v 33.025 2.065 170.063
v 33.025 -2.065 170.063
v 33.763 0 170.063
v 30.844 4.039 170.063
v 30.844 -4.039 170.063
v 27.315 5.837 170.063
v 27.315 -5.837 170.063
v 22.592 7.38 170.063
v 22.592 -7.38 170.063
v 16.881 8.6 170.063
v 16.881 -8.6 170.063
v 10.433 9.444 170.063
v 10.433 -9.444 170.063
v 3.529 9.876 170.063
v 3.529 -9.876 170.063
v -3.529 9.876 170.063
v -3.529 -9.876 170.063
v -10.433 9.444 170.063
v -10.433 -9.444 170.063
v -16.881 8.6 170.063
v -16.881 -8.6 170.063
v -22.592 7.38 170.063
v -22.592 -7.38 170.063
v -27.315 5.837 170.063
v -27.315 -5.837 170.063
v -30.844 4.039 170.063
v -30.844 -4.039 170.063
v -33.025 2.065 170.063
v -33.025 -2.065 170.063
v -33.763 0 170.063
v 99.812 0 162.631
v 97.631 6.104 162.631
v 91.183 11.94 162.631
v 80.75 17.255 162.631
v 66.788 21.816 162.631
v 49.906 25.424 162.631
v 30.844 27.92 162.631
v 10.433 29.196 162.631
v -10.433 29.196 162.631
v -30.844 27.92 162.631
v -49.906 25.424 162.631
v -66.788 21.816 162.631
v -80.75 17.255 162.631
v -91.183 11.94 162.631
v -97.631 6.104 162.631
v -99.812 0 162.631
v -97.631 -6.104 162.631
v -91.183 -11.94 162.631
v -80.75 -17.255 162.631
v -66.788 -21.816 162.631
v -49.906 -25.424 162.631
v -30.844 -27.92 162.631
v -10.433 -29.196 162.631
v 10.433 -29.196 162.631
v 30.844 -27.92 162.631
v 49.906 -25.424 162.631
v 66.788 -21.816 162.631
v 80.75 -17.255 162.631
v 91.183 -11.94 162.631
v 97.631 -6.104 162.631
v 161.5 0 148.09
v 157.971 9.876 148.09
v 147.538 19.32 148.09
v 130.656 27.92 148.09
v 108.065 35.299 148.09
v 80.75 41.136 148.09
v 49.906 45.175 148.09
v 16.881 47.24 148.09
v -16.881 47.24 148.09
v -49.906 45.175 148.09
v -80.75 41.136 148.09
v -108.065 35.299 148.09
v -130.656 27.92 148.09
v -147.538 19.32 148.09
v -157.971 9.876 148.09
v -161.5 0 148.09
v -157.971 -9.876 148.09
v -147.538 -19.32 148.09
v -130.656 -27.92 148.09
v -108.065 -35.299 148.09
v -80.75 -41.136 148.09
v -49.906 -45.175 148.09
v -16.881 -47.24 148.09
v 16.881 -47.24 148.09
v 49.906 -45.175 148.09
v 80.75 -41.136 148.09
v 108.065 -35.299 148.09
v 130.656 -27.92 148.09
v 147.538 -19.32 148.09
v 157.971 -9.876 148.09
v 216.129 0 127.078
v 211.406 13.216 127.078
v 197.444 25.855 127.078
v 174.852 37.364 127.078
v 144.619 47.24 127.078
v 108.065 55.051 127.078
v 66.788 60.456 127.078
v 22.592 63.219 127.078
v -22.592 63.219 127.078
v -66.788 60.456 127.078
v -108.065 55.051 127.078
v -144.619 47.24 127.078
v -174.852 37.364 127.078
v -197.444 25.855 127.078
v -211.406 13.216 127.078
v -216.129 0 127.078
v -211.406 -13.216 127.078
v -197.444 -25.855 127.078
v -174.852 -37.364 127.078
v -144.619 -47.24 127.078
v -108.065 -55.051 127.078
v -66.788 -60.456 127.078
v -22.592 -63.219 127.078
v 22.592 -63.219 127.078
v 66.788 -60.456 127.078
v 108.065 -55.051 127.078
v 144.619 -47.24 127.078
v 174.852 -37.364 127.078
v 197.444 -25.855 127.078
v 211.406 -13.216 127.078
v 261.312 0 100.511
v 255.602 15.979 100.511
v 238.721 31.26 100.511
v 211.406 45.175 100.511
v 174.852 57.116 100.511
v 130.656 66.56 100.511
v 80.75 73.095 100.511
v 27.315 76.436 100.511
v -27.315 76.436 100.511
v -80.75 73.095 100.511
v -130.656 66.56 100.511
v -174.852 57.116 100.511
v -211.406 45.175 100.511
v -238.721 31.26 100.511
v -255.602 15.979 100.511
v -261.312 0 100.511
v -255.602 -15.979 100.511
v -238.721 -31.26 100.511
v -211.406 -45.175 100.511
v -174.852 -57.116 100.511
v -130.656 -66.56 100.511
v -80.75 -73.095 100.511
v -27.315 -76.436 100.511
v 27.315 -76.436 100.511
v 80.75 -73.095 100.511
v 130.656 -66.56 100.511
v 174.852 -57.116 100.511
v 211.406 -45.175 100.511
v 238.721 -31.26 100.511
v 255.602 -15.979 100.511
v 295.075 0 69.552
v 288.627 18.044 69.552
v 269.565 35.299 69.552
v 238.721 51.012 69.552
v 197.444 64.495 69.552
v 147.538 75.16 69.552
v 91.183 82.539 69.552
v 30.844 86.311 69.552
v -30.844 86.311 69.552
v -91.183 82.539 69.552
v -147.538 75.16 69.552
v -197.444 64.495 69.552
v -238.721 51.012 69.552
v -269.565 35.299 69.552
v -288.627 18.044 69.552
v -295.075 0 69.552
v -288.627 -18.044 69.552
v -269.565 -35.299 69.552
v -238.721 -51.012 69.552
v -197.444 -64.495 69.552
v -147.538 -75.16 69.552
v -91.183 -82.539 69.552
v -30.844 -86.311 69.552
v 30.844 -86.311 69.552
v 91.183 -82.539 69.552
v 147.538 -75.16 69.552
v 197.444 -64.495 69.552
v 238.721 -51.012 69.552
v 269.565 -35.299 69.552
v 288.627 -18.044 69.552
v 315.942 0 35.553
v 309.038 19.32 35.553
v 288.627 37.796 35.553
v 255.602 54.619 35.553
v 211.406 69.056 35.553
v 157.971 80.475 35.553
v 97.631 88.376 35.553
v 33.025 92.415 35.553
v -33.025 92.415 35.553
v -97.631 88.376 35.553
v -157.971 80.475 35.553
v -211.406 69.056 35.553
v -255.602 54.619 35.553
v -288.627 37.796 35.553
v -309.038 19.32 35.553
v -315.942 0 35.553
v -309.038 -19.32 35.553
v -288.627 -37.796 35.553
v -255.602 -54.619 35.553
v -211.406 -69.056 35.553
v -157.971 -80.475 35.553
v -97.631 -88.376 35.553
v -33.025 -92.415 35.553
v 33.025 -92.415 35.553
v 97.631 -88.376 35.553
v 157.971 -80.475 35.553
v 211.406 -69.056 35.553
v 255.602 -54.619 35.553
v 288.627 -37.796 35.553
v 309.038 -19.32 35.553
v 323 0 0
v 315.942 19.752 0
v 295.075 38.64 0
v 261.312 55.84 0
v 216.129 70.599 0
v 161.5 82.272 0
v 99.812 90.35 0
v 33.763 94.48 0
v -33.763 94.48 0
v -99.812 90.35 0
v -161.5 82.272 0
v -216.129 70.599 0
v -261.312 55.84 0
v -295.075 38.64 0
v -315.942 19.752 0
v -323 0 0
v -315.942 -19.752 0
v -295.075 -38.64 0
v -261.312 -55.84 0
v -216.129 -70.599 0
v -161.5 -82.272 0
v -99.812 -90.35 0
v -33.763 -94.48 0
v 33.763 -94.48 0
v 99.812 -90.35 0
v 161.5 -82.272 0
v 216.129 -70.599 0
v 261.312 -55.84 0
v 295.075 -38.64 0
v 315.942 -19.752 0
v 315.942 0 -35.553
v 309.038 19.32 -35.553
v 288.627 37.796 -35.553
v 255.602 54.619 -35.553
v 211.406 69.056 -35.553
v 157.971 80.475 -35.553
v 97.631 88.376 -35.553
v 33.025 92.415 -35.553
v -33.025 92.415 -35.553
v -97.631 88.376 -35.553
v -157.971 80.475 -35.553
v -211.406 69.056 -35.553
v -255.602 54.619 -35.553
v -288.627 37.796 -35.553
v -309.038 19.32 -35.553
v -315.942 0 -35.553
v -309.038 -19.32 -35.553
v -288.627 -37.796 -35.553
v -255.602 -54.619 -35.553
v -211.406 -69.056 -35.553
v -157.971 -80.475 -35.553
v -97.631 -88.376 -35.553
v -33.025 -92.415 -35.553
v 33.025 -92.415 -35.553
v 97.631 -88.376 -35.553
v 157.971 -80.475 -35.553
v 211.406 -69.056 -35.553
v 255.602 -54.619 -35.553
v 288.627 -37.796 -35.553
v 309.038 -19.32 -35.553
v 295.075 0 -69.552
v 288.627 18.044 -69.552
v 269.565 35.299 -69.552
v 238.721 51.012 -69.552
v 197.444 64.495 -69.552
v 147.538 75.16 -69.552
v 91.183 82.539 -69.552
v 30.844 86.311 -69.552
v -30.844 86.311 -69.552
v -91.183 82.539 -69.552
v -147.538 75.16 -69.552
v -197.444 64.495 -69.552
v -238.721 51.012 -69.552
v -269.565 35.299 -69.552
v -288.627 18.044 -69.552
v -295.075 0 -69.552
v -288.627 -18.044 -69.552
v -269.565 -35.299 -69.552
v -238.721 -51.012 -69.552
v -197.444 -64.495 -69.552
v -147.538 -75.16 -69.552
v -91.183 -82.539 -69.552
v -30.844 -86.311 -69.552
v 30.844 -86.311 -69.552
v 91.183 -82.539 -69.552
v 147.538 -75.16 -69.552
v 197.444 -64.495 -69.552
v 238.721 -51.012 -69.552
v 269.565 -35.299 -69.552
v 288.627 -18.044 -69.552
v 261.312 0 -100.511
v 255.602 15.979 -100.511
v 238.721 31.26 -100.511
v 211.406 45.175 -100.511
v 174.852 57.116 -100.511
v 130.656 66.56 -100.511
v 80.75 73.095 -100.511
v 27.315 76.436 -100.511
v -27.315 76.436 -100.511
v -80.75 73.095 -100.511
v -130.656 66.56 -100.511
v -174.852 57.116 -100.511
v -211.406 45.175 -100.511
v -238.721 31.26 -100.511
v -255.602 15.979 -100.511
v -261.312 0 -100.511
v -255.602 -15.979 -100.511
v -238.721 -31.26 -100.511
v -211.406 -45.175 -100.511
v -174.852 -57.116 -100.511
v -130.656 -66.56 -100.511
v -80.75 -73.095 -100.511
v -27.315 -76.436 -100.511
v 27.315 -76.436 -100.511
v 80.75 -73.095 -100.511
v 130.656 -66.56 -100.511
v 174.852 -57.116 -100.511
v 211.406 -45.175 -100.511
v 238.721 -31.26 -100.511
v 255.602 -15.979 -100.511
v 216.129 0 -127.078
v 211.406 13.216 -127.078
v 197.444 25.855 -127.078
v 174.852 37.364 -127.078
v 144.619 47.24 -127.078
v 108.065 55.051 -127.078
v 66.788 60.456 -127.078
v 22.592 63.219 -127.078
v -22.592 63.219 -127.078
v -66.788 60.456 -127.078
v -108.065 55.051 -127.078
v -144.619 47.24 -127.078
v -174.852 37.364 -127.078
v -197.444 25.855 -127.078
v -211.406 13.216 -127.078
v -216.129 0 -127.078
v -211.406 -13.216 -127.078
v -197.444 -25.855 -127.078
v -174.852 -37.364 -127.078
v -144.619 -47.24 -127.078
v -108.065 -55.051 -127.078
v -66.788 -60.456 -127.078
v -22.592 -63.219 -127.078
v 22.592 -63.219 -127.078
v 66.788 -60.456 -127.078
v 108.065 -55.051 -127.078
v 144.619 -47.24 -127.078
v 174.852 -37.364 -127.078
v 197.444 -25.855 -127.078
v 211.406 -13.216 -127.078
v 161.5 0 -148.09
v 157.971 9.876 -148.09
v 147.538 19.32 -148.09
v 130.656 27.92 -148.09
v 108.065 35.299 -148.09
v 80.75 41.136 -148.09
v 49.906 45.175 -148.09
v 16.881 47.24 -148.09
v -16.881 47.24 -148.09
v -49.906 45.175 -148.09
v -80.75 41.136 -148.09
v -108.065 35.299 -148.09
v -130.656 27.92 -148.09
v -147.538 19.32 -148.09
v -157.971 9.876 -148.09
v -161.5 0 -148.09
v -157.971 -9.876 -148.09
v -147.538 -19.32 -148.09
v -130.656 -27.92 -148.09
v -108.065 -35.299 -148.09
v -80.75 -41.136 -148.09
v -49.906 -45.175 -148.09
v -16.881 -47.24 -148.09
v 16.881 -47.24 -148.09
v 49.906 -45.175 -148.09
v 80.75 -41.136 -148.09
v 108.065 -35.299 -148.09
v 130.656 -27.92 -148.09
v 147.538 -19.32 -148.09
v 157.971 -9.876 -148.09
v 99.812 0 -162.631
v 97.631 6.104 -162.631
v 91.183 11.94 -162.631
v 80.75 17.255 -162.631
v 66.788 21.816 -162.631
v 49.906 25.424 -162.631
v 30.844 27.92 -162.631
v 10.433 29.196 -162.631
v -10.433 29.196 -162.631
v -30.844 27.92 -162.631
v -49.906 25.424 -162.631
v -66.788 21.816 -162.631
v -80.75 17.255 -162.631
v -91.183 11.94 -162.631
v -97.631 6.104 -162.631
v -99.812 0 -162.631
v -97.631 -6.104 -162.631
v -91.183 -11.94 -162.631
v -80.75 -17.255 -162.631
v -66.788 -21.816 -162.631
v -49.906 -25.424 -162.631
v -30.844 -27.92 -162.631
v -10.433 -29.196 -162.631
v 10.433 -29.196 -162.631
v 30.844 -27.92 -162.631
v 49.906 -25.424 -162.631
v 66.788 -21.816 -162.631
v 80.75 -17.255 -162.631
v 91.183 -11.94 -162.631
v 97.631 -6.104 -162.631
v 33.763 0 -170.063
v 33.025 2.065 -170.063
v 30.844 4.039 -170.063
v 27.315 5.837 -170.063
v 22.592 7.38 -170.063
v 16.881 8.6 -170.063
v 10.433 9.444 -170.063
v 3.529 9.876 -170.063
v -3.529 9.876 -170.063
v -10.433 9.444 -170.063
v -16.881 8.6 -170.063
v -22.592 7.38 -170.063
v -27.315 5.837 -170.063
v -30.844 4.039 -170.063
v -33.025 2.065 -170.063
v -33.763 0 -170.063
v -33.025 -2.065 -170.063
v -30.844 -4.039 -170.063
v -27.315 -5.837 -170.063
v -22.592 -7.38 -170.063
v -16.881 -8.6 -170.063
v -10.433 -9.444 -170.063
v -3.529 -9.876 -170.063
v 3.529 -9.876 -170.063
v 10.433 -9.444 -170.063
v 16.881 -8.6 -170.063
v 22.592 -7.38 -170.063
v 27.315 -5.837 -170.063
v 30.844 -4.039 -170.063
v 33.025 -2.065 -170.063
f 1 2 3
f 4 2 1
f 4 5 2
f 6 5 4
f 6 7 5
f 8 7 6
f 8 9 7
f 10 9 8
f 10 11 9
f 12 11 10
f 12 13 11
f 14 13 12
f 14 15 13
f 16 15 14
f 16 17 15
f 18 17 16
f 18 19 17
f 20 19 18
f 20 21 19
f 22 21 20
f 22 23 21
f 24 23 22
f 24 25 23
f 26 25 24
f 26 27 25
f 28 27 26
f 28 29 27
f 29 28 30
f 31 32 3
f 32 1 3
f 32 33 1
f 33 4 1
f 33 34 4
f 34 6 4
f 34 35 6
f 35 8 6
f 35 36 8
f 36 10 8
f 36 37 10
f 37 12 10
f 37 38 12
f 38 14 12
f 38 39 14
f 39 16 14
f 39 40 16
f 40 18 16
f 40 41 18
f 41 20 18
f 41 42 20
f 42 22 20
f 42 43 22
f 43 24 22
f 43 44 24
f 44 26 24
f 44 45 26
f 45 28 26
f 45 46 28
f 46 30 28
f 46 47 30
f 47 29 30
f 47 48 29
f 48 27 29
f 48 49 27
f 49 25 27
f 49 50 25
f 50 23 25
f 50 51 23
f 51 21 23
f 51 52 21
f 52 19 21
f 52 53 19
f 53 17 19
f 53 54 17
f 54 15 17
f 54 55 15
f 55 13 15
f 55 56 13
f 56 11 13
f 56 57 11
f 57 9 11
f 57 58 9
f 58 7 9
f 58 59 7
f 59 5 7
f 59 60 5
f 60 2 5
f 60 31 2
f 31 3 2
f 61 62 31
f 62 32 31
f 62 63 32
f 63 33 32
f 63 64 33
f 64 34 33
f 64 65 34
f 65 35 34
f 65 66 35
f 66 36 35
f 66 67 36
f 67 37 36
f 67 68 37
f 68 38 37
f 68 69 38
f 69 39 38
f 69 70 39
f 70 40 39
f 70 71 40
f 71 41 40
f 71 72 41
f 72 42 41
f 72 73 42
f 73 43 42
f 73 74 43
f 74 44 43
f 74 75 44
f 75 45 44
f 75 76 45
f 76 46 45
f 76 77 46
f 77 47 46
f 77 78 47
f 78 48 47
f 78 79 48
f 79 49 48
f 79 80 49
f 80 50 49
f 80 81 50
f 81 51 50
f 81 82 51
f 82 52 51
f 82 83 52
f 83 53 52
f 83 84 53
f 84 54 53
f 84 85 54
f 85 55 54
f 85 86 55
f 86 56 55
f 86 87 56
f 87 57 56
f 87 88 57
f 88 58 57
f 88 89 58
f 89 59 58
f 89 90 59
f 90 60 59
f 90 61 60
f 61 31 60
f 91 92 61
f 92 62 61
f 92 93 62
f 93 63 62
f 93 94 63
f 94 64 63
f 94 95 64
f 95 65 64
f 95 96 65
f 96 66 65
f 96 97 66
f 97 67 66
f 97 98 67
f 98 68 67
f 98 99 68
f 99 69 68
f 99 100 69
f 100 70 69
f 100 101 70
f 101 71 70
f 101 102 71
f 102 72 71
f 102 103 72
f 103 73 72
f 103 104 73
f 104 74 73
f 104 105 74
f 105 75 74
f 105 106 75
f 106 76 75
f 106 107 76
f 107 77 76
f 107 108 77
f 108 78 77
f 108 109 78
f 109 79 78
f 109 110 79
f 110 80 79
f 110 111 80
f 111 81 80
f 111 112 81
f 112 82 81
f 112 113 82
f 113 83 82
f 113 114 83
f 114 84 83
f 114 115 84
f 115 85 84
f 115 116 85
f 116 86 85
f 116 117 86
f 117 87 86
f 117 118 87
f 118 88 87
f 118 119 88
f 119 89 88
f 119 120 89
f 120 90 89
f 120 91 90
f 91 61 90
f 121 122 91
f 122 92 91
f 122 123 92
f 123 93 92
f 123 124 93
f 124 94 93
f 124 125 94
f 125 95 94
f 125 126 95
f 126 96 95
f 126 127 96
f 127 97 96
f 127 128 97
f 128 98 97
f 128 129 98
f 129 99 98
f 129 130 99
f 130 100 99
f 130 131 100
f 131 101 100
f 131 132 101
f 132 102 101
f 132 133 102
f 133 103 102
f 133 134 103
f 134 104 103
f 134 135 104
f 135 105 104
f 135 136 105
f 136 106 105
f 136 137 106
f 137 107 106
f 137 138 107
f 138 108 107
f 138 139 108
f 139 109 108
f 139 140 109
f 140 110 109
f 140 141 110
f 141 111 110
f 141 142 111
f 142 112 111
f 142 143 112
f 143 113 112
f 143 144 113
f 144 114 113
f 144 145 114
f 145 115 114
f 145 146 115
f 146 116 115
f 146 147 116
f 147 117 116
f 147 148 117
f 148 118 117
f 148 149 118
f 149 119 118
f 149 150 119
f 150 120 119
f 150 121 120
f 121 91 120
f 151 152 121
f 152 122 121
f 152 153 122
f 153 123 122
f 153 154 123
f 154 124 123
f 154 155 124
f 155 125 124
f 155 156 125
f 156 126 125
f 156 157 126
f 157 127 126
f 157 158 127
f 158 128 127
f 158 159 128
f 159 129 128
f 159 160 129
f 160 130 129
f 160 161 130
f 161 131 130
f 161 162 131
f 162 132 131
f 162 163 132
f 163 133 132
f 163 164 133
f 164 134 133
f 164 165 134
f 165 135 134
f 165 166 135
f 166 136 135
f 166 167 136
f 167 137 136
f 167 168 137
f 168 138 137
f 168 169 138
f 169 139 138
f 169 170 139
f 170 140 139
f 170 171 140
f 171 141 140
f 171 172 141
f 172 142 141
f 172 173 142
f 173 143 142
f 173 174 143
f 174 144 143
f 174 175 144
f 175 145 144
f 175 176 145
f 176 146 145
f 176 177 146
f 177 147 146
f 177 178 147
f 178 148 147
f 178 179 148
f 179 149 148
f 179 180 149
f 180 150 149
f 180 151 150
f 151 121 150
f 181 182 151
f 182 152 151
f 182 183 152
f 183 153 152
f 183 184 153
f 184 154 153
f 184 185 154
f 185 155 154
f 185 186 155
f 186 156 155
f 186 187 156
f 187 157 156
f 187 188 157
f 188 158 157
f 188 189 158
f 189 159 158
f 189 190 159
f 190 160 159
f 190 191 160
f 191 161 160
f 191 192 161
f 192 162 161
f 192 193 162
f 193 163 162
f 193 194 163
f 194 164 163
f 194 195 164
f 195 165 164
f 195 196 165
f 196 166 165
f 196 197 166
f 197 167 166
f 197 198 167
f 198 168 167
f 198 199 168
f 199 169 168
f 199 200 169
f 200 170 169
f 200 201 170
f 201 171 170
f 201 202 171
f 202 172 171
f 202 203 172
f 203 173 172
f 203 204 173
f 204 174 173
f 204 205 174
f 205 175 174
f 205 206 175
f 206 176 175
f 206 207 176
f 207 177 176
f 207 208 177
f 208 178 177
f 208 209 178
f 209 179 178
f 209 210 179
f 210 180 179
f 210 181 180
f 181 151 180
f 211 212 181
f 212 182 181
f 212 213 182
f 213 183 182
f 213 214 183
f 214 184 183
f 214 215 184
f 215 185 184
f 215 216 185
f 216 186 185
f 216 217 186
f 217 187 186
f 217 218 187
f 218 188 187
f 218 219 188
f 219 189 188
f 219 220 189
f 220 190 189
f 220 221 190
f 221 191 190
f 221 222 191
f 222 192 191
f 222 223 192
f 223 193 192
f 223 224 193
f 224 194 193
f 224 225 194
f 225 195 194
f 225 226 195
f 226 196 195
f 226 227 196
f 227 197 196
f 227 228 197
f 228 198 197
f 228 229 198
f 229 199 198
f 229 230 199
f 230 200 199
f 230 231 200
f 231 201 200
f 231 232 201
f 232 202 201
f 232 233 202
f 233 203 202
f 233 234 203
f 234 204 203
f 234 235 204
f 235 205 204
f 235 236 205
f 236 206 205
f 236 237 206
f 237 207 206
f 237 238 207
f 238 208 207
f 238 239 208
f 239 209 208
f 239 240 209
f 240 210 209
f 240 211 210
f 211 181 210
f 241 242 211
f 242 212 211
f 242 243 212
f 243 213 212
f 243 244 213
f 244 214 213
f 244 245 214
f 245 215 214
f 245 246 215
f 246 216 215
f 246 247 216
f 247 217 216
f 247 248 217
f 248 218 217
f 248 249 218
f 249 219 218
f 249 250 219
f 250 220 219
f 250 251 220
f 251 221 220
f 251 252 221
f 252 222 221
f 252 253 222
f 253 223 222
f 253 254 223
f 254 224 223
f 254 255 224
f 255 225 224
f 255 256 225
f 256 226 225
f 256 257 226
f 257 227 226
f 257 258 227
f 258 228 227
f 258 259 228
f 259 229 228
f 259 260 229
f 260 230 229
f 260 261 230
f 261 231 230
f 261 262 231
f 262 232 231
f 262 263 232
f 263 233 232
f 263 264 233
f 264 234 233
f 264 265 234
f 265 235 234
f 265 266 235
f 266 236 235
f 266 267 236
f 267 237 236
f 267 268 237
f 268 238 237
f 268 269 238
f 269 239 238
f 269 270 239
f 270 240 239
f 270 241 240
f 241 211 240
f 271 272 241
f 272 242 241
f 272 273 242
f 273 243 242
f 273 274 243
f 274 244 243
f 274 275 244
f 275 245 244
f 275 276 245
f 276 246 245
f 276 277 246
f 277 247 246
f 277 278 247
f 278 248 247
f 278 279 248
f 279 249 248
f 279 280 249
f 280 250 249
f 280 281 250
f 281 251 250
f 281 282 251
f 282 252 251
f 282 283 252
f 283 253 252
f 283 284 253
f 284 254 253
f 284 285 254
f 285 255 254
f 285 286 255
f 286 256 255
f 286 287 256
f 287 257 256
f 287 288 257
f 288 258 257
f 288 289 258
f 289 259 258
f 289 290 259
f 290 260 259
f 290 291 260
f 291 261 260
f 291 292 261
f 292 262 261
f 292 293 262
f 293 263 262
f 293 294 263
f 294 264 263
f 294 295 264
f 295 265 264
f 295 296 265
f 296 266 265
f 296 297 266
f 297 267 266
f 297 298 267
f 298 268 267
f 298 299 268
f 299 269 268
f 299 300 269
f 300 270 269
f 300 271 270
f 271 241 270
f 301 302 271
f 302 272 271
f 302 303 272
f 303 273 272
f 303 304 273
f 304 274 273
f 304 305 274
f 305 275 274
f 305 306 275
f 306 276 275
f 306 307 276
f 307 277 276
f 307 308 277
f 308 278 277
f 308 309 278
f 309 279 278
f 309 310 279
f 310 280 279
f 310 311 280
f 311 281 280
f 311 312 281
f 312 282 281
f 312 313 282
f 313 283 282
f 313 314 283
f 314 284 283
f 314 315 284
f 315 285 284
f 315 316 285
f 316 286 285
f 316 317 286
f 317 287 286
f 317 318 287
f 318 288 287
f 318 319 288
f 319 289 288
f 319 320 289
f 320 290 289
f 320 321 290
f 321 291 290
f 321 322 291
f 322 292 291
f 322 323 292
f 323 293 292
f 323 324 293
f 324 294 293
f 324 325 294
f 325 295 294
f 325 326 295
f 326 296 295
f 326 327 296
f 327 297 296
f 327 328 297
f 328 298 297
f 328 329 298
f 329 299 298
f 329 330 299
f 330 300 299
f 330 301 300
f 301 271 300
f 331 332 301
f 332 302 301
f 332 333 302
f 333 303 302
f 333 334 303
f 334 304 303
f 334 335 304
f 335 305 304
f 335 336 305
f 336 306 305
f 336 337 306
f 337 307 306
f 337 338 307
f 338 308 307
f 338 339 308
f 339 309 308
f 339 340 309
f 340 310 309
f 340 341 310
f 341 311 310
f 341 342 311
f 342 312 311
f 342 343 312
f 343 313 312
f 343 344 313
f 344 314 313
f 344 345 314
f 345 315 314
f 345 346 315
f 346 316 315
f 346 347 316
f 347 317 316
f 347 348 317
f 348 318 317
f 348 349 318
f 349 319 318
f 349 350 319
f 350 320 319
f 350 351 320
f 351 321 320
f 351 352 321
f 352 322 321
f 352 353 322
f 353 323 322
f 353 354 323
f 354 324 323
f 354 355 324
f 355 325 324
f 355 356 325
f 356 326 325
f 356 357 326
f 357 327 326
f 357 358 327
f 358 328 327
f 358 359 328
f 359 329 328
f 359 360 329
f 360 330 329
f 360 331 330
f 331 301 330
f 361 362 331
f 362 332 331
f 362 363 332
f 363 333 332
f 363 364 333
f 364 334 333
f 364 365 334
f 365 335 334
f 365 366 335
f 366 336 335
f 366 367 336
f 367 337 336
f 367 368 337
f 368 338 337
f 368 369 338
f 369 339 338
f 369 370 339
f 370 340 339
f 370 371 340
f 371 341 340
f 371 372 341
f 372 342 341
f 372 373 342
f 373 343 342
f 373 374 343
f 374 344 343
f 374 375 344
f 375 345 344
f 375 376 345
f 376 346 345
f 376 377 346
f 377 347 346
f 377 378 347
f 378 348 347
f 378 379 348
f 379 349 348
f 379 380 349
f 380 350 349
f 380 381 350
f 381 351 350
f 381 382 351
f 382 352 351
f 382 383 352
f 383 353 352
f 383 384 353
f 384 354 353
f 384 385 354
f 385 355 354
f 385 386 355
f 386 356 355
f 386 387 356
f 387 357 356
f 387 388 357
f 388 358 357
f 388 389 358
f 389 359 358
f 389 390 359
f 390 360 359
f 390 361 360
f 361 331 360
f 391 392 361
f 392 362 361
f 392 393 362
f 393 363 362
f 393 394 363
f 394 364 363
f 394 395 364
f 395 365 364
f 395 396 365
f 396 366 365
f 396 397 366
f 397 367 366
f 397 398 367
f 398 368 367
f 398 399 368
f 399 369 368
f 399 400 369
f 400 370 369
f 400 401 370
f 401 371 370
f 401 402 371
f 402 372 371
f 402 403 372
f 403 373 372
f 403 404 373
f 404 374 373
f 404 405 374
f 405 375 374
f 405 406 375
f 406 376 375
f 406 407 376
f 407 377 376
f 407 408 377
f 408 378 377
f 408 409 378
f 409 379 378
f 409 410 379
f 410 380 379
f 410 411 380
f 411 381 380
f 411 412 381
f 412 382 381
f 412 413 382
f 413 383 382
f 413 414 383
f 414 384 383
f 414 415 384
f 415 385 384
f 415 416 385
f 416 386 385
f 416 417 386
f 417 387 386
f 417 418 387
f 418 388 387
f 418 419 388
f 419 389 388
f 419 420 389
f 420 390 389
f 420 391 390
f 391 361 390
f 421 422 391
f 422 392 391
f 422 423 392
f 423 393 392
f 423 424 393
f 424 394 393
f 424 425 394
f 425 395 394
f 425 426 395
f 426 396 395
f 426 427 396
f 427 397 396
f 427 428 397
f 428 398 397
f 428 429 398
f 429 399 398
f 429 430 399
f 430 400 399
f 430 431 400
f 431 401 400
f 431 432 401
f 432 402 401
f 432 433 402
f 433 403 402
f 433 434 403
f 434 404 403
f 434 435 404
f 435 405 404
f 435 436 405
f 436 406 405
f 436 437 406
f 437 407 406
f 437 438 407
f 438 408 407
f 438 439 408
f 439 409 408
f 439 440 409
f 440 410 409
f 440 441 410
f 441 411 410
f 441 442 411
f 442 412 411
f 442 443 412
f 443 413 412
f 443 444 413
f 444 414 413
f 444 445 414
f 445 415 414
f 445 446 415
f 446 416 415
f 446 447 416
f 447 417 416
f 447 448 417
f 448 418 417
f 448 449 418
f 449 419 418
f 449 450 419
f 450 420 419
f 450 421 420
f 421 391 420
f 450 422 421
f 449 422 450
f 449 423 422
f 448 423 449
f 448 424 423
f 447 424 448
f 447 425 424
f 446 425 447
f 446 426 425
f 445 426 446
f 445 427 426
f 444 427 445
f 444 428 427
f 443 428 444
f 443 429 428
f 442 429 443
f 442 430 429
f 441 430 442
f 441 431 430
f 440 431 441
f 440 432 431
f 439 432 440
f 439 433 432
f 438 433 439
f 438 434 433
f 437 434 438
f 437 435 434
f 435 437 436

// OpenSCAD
// Generated by SolidPython 1.0.1 on 2020-07-29 00:46:52


scale(v = [17, 5, 9]) {
	sphere(r = 19);
}
/***********************************************
*********      SolidPython code:      **********
************************************************
 
# import packages: SolidPython
from solid import *
from solid.utils import *
from itertools import chain, combinations, permutations


class Resize:

    def __init__(self, scad_file):
        self.scad_file = scad_file
        #self.scad_file = import_scad(scad_file)
        # cone/cylinder param:
        self.r1 = 0
        self.r2 = 0
        self.h = 0
        # rectangular prism param:
        self.w = 0
        self.l = 0
        # ellipse param:
        self.r = 0

    # import OpenScad code (file name corresponds to shape)


    # classify shape + parameters
    def assign(self, param1, param2, param3):
        if self.scad_file == 'cone.scad':
            self.r1 = param1
            self.r2 = param2
            self.h = param3
        elif self.scad_file == 'cylinder.scad':
            self.r1 = param1
            self.r2 = param2
            self.h = param3
        elif self.scad_file == 'rectangularPrism.scad':
            self.h = param1
            self.l = param2
            self.w = param3
        else:
            self.r = param1
            self.h = param2

    # resize parameters
    def iterate(self):
        x = range(3, 20, 2)
        i = 1
        if self.scad_file == 'cone.scad':
            tempList = list(permutations(x, 2))
            for temp in tempList:
                param1 = temp[0]
                param2 = temp[1]
                filepath = 'produced_scad_files/' + 'cone' + str(param1) + '_' + str(param2) + '_' + '.scad'
                scad_render_to_file(cylinder(h=param1, r1=param2, r2=0), filepath)

        elif self.scad_file == 'cylinder.scad':
            tempList = list(permutations(x, 3))
            for temp in tempList:
                param1 = temp[0]
                param2 = temp[1]
                filepath = 'produced_scad_files/' + 'cylinder' + str(param1) + '_' + str(param2) + '_' + '.scad'
                scad_render_to_file(cylinder(h=param1, r1=param2, r2=param2), filepath)

        elif self.scad_file == 'rectangularPrism.scad':
            tempList = list(permutations(x, 3))
            for temp in tempList:
                param1 = temp[0]
                param2 = temp[1]
                param3 = temp[2]
                filepath = 'produced_scad_files/' + 'rectangularPrism' + str(param1) + '_' + str(param2) + '_' + str(
                    param3) + '.scad'
                scad_render_to_file(cube(size=(param1, param2, param3)), filepath)

        elif self.scad_file == 'ellipse.scad':
            tempList = list(permutations(x, 4))
            for temp in tempList:
                param1 = temp[0]
                param2 = temp[1]
                param3 = temp[2]
                param4 = temp[3]
                filepath = 'produced_scad_files/' + 'ellipse' + str(param1) + '_' + str(param2) + '_' + str(param3) + '_' + str(param4) + '.scad'
                scad_render_to_file(scale([param1, param2, param3])(sphere(r=param4)), filepath)

    def render_to_scadfile(self):
        scad_render_to_file(scad, 'example.scad') 
 
************************************************/
